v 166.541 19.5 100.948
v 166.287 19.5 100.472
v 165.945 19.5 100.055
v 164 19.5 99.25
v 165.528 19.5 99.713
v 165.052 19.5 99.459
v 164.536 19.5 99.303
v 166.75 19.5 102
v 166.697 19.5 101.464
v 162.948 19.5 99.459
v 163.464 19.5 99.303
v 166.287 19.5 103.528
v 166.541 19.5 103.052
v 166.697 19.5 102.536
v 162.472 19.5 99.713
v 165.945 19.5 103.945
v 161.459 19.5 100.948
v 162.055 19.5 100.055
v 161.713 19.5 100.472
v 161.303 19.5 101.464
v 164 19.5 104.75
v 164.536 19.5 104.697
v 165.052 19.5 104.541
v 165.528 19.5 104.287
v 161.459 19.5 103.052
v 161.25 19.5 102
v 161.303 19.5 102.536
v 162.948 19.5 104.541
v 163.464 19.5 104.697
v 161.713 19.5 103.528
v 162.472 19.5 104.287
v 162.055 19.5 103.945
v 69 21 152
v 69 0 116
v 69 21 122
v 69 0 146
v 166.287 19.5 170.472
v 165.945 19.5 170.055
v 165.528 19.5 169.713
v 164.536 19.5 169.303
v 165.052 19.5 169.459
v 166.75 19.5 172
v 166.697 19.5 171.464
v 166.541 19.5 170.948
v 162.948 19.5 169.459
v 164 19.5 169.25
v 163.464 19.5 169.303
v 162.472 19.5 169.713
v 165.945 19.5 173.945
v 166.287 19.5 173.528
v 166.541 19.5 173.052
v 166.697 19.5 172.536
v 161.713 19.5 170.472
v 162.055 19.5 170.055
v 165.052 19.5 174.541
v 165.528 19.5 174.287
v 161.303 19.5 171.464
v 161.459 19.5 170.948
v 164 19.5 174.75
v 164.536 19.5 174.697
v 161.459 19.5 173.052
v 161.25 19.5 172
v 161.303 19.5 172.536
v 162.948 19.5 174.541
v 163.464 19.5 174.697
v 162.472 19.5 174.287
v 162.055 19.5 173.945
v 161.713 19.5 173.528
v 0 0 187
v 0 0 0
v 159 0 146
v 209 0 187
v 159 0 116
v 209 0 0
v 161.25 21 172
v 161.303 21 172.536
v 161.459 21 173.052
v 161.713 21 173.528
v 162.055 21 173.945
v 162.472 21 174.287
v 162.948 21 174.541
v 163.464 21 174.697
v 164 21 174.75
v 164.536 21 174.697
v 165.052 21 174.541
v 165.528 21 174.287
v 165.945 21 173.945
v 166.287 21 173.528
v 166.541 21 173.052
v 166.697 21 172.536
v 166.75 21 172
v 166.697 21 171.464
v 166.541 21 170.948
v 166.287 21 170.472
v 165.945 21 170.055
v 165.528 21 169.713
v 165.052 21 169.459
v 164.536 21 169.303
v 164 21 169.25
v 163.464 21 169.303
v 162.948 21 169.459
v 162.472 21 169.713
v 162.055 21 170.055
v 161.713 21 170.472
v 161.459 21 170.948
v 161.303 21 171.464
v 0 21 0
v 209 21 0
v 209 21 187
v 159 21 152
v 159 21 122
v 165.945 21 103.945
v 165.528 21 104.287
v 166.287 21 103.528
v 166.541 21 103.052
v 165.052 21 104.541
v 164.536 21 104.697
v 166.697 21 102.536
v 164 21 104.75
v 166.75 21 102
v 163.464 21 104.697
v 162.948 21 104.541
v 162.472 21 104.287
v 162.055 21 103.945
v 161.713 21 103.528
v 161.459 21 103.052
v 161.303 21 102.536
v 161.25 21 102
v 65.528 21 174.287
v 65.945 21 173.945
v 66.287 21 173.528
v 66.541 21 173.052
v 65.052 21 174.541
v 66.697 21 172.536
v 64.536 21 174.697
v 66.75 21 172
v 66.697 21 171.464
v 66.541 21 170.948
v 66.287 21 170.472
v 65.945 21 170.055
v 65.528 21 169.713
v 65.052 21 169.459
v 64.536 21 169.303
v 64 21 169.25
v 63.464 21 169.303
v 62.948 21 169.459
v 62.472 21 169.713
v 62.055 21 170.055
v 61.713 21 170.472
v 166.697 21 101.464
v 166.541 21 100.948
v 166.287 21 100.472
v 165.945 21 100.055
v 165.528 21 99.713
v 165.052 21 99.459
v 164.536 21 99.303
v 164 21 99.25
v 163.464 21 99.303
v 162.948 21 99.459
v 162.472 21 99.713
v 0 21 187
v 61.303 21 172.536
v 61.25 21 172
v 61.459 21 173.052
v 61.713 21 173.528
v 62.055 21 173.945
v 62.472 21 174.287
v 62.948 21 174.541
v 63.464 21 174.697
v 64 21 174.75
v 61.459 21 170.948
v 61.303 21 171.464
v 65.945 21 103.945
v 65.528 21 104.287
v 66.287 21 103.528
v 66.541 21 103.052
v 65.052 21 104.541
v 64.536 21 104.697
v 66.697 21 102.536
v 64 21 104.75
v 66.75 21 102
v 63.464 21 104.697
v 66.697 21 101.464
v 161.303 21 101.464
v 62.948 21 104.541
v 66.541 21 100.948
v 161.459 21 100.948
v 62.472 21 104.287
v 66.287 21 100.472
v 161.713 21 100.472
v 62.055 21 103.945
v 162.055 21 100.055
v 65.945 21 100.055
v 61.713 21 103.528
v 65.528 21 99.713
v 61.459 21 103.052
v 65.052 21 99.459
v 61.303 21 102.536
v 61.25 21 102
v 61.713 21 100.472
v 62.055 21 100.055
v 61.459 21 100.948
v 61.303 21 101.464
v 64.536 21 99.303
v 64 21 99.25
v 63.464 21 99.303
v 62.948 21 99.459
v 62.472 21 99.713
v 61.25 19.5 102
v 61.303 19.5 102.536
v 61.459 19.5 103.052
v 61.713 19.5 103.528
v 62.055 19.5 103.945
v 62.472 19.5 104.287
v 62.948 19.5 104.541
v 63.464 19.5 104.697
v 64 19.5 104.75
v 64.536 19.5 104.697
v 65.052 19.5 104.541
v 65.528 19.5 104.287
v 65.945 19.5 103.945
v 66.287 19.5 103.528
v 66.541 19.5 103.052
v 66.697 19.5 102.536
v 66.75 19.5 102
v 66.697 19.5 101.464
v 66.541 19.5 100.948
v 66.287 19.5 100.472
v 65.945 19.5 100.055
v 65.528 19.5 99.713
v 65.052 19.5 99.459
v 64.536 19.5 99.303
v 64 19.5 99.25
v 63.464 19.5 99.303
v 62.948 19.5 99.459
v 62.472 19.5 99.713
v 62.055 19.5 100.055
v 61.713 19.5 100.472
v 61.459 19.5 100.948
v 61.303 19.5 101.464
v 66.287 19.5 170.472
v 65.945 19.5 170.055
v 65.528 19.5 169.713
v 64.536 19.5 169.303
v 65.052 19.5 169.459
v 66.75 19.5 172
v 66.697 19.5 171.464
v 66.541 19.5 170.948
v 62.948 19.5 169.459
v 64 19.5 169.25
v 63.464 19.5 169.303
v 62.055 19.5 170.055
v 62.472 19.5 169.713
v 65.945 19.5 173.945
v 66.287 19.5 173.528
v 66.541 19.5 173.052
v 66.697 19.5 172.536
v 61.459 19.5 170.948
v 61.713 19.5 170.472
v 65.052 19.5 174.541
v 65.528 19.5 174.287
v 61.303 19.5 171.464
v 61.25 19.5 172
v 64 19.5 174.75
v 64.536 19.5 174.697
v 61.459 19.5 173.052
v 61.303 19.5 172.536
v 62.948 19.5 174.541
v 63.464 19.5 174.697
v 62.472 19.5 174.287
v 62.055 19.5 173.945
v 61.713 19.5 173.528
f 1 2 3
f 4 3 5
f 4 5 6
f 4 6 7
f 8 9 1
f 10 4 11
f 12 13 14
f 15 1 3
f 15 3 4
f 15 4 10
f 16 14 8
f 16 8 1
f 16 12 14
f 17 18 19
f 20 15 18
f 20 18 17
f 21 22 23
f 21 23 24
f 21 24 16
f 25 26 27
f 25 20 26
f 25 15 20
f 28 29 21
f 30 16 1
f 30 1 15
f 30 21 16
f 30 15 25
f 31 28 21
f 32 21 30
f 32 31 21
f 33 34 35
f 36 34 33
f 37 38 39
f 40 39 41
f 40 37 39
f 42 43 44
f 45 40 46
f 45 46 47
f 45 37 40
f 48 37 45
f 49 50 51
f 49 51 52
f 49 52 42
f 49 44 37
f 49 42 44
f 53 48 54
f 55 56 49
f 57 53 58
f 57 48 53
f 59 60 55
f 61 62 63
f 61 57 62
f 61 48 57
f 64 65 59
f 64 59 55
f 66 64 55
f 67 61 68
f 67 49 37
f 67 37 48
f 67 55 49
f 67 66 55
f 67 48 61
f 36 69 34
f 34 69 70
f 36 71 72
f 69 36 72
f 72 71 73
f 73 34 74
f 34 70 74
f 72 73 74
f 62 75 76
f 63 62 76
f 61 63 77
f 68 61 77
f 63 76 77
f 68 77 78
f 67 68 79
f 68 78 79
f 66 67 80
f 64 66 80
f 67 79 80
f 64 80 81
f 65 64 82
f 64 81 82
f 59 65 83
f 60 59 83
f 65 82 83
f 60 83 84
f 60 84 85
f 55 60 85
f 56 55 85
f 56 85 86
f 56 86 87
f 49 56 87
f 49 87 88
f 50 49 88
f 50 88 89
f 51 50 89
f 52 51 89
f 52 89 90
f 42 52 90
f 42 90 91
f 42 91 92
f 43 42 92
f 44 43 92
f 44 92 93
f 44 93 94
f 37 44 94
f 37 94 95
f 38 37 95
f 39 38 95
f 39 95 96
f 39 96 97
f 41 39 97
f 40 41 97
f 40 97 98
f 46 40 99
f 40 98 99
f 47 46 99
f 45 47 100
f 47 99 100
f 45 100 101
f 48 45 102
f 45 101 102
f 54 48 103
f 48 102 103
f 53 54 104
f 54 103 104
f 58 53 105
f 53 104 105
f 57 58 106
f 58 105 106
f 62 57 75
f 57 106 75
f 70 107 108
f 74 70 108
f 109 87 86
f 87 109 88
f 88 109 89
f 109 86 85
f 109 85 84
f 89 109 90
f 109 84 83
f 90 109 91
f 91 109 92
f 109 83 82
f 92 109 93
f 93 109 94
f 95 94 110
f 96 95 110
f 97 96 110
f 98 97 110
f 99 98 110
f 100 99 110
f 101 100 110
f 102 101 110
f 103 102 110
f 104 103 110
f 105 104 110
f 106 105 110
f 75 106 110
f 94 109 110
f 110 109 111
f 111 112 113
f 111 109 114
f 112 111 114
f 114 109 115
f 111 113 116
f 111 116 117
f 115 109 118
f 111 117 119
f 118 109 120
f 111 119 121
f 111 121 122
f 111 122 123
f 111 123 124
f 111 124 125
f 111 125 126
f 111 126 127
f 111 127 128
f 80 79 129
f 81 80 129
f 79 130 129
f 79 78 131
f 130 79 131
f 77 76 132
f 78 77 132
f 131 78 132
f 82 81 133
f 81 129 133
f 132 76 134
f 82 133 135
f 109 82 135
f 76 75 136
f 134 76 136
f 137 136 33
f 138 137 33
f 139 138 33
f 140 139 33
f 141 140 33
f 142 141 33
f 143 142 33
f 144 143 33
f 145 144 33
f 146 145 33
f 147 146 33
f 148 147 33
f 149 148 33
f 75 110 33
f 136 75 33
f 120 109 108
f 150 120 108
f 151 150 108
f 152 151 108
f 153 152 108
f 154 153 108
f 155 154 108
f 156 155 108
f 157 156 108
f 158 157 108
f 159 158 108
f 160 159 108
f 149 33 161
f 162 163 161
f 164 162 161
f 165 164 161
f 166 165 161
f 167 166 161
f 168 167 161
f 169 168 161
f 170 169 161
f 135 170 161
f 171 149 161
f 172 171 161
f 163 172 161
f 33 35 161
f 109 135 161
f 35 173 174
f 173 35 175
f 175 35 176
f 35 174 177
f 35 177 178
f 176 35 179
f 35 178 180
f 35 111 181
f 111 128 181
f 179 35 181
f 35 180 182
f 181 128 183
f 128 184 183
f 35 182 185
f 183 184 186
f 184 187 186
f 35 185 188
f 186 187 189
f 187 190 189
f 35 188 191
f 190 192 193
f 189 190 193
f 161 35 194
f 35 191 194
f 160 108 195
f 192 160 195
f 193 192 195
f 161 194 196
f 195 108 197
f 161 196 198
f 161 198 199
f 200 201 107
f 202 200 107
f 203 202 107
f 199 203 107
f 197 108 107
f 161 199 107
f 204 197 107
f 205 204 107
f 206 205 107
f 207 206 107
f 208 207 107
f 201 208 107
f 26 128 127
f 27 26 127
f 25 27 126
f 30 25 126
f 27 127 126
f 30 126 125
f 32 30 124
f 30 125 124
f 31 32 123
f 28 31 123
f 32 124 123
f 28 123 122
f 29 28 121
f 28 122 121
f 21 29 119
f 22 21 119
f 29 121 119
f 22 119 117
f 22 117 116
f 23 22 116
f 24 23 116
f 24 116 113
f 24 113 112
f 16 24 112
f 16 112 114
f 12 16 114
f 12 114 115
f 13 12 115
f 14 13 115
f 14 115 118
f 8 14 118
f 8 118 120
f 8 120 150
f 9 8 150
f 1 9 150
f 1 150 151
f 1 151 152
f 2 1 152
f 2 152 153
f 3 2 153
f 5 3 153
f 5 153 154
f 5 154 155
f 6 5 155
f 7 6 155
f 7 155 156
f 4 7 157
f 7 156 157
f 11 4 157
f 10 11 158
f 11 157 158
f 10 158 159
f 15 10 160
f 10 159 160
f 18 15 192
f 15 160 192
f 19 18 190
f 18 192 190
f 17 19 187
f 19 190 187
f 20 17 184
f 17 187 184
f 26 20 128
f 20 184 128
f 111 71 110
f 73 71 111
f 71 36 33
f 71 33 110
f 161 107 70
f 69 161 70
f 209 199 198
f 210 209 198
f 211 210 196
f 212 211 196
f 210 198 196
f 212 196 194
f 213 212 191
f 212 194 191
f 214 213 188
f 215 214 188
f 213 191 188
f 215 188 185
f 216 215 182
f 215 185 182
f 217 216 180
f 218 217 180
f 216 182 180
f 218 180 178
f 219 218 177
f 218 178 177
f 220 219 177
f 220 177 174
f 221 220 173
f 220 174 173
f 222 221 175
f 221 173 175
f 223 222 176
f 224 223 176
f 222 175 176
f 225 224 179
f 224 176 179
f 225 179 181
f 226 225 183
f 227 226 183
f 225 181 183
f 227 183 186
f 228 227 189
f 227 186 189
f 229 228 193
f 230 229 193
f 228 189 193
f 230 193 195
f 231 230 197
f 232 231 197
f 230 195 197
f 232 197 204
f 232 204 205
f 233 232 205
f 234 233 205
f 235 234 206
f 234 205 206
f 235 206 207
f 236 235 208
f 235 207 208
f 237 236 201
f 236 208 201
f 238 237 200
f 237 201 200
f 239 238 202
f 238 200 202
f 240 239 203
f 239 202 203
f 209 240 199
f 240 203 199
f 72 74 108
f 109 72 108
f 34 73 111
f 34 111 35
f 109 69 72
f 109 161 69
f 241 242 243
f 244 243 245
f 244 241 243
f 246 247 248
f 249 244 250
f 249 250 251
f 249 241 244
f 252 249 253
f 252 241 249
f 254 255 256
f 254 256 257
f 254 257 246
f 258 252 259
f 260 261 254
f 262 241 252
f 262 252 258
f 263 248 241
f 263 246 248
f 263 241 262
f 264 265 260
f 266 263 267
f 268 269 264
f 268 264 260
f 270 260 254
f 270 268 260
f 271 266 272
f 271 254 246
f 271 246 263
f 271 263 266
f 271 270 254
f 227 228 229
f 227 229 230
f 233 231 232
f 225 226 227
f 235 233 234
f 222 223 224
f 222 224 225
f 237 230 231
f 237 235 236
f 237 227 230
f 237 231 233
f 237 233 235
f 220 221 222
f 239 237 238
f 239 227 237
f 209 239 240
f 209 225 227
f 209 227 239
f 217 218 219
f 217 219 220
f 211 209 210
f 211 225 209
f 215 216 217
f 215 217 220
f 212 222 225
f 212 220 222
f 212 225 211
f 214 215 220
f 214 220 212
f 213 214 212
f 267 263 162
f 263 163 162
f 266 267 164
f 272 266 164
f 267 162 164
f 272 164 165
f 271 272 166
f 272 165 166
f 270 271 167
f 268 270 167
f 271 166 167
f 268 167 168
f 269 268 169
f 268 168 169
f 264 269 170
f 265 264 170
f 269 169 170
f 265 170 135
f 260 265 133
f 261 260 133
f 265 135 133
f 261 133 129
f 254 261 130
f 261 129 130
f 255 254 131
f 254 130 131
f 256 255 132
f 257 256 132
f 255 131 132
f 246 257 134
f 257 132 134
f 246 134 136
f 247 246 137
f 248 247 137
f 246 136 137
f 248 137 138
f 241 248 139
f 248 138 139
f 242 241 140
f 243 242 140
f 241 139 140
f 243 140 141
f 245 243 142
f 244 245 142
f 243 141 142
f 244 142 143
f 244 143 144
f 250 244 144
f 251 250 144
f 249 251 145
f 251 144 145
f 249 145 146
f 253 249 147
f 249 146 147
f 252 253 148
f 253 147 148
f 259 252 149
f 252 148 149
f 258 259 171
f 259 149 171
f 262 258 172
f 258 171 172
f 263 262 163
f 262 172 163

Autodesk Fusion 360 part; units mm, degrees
sketch "Smartie Feed" plane through (0, 0, 0) normal (0, 0, 1) x (1, 0, 0)
  line L0 (0, 0) -> (209, 0)
  line L1 (209, 0) -> (209, 21)
  line L2 (209, 21) -> (0, 21)
  line L3 (0, 21) -> (0, 0)
  dimension "d1" = 209
  dimension "d2" = 21
extrude "Extrude1" add sketch "Smartie Feed" along normal blind 187
sketch "Outlet" plane through (0, 0, 0) normal (0, -1, 0) x (1, 0, 0)
  line L0 (0, 0) -> (209, 0)
  line L1 (209, 0) -> (209, 187)
  line L2 (209, 187) -> (0, 187)
  line L3 (0, 187) -> (0, 0)
  line L4 (69, 146) -> (159, 146)
  line L5 (159, 146) -> (159, 116)
  line L6 (159, 116) -> (69, 116)
  line L7 (69, 116) -> (69, 146)
  dimension "d31" = 30
  dimension "d32" = 90
  dimension "d33" = 69
  dimension "d34" = 50
  dimension "d35" = 41
sketch "Inlet" plane through (0, 21, 0) normal (0, 1, 0) x (-1, 0, 0)
  line L0 (-209, 0) -> (0, 0)
  line L1 (0, 0) -> (0, 187)
  line L2 (0, 187) -> (-209, 187)
  line L3 (-209, 187) -> (-209, 0)
  line L4 (-69, 152) -> (-159, 152)
  line L5 (-159, 152) -> (-159, 122)
  line L6 (-159, 122) -> (-69, 122)
  line L7 (-69, 122) -> (-69, 152)
  dimension "d36" = 90
  dimension "d37" = 69
  dimension "d38" = 30
  dimension "d39" = 35
  dimension "d40" = 50
loft "Loft9" cut profiles "Inlet", "Outlet" section 1 contours L4 L5 L6 L7 section 2 contours L4 L5 L6 L7
sketch "Sketch6" plane through (0, 21, 0) normal (0, 1, 0) x (-1, 0, 0)
  line L0 (-69, 152) -> (-69, 122)
  line L1 (-69, 122) -> (-159, 122)
  line L2 (-159, 122) -> (-159, 152)
  line L3 (-159, 152) -> (-69, 152)
  line L4 (-209, 0) -> (0, 0)
  line L5 (0, 0) -> (0, 187)
  line L6 (0, 187) -> (-209, 187)
  line L7 (-209, 187) -> (-209, 0)
  circle A0 centre (-164, 172) radius 2.75
  circle A1 centre (-64, 172) radius 2.75
  circle A2 centre (-164, 102) radius 2.75
  circle A3 centre (-64, 102) radius 2.75
  dimension "d43" = 5.5
  dimension "d44" = 5.5
  dimension "d45" = 5.5
  dimension "d46" = 5.5
  dimension "d49" = 64
  dimension "d50" = 64
  dimension "d51" = 164
  dimension "d52" = 164
  dimension "d53" = 20
  dimension "d54" = 20
  dimension "d55" = 20
  dimension "d56" = 20
extrude "Extrude2" cut sketch "Sketch6" against normal blind 1.5 contours A0 | A1 | A2 | A3
equation "d1 = 219 mm - 10 mm"
equation "d3 = 166 mm + 21 mm"
equation "outletHeight = 15 mm" comment "Height of the outlets into the sorted containers"
equation "outletWidth = 20 mm" comment "Width of the outlets into the sorted containers"
equation "sortedContainersMidpointWidth = sortedContainersWidth + polycarbonateThickness" comment "Width between the midpoints of the sorted containers"
equation "sortedContainersWidth = 60 mm" comment "Width of the sorted containers"
equation "sortedContainersHeight = 113 mm" comment "Height of the sorted containers"
equation "polycarbonateThickness = 6 mm" comment "Thickness of the polycarbonate"
equation "sortedContainersMidpointHeight = sortedContainersHeight + polycarbonateThickness" comment "Height between the midpoints of the sorted containers"
equation "d33 = 90 mm - 21 mm"
equation "d35 = 30 mm - 21 mm + 5 mm + 6 mm + 21 mm"
equation "d37 = 90 mm - 21 mm"
equation "d39 = 30 mm - 21 mm + 5 mm + 21 mm"
equation "magnetDiameter = 5 mm"
equation "magnetHeight = 1.5 mm"
equation "d43 = magnetDiameter + 0.5 mm"
equation "d44 = magnetDiameter + 0.5 mm"
equation "d45 = magnetDiameter + 0.5 mm"
equation "d46 = magnetDiameter + 0.5 mm"
equation "d47 = -magnetHeight"
equation "d49 = 75 mm - 21 mm + 10 mm"
equation "d50 = 75 mm - 21 mm + 10 mm"
equation "d51 = 195 mm - 10 mm - 21 mm"
equation "d52 = 195 mm - 10 mm - 21 mm"
